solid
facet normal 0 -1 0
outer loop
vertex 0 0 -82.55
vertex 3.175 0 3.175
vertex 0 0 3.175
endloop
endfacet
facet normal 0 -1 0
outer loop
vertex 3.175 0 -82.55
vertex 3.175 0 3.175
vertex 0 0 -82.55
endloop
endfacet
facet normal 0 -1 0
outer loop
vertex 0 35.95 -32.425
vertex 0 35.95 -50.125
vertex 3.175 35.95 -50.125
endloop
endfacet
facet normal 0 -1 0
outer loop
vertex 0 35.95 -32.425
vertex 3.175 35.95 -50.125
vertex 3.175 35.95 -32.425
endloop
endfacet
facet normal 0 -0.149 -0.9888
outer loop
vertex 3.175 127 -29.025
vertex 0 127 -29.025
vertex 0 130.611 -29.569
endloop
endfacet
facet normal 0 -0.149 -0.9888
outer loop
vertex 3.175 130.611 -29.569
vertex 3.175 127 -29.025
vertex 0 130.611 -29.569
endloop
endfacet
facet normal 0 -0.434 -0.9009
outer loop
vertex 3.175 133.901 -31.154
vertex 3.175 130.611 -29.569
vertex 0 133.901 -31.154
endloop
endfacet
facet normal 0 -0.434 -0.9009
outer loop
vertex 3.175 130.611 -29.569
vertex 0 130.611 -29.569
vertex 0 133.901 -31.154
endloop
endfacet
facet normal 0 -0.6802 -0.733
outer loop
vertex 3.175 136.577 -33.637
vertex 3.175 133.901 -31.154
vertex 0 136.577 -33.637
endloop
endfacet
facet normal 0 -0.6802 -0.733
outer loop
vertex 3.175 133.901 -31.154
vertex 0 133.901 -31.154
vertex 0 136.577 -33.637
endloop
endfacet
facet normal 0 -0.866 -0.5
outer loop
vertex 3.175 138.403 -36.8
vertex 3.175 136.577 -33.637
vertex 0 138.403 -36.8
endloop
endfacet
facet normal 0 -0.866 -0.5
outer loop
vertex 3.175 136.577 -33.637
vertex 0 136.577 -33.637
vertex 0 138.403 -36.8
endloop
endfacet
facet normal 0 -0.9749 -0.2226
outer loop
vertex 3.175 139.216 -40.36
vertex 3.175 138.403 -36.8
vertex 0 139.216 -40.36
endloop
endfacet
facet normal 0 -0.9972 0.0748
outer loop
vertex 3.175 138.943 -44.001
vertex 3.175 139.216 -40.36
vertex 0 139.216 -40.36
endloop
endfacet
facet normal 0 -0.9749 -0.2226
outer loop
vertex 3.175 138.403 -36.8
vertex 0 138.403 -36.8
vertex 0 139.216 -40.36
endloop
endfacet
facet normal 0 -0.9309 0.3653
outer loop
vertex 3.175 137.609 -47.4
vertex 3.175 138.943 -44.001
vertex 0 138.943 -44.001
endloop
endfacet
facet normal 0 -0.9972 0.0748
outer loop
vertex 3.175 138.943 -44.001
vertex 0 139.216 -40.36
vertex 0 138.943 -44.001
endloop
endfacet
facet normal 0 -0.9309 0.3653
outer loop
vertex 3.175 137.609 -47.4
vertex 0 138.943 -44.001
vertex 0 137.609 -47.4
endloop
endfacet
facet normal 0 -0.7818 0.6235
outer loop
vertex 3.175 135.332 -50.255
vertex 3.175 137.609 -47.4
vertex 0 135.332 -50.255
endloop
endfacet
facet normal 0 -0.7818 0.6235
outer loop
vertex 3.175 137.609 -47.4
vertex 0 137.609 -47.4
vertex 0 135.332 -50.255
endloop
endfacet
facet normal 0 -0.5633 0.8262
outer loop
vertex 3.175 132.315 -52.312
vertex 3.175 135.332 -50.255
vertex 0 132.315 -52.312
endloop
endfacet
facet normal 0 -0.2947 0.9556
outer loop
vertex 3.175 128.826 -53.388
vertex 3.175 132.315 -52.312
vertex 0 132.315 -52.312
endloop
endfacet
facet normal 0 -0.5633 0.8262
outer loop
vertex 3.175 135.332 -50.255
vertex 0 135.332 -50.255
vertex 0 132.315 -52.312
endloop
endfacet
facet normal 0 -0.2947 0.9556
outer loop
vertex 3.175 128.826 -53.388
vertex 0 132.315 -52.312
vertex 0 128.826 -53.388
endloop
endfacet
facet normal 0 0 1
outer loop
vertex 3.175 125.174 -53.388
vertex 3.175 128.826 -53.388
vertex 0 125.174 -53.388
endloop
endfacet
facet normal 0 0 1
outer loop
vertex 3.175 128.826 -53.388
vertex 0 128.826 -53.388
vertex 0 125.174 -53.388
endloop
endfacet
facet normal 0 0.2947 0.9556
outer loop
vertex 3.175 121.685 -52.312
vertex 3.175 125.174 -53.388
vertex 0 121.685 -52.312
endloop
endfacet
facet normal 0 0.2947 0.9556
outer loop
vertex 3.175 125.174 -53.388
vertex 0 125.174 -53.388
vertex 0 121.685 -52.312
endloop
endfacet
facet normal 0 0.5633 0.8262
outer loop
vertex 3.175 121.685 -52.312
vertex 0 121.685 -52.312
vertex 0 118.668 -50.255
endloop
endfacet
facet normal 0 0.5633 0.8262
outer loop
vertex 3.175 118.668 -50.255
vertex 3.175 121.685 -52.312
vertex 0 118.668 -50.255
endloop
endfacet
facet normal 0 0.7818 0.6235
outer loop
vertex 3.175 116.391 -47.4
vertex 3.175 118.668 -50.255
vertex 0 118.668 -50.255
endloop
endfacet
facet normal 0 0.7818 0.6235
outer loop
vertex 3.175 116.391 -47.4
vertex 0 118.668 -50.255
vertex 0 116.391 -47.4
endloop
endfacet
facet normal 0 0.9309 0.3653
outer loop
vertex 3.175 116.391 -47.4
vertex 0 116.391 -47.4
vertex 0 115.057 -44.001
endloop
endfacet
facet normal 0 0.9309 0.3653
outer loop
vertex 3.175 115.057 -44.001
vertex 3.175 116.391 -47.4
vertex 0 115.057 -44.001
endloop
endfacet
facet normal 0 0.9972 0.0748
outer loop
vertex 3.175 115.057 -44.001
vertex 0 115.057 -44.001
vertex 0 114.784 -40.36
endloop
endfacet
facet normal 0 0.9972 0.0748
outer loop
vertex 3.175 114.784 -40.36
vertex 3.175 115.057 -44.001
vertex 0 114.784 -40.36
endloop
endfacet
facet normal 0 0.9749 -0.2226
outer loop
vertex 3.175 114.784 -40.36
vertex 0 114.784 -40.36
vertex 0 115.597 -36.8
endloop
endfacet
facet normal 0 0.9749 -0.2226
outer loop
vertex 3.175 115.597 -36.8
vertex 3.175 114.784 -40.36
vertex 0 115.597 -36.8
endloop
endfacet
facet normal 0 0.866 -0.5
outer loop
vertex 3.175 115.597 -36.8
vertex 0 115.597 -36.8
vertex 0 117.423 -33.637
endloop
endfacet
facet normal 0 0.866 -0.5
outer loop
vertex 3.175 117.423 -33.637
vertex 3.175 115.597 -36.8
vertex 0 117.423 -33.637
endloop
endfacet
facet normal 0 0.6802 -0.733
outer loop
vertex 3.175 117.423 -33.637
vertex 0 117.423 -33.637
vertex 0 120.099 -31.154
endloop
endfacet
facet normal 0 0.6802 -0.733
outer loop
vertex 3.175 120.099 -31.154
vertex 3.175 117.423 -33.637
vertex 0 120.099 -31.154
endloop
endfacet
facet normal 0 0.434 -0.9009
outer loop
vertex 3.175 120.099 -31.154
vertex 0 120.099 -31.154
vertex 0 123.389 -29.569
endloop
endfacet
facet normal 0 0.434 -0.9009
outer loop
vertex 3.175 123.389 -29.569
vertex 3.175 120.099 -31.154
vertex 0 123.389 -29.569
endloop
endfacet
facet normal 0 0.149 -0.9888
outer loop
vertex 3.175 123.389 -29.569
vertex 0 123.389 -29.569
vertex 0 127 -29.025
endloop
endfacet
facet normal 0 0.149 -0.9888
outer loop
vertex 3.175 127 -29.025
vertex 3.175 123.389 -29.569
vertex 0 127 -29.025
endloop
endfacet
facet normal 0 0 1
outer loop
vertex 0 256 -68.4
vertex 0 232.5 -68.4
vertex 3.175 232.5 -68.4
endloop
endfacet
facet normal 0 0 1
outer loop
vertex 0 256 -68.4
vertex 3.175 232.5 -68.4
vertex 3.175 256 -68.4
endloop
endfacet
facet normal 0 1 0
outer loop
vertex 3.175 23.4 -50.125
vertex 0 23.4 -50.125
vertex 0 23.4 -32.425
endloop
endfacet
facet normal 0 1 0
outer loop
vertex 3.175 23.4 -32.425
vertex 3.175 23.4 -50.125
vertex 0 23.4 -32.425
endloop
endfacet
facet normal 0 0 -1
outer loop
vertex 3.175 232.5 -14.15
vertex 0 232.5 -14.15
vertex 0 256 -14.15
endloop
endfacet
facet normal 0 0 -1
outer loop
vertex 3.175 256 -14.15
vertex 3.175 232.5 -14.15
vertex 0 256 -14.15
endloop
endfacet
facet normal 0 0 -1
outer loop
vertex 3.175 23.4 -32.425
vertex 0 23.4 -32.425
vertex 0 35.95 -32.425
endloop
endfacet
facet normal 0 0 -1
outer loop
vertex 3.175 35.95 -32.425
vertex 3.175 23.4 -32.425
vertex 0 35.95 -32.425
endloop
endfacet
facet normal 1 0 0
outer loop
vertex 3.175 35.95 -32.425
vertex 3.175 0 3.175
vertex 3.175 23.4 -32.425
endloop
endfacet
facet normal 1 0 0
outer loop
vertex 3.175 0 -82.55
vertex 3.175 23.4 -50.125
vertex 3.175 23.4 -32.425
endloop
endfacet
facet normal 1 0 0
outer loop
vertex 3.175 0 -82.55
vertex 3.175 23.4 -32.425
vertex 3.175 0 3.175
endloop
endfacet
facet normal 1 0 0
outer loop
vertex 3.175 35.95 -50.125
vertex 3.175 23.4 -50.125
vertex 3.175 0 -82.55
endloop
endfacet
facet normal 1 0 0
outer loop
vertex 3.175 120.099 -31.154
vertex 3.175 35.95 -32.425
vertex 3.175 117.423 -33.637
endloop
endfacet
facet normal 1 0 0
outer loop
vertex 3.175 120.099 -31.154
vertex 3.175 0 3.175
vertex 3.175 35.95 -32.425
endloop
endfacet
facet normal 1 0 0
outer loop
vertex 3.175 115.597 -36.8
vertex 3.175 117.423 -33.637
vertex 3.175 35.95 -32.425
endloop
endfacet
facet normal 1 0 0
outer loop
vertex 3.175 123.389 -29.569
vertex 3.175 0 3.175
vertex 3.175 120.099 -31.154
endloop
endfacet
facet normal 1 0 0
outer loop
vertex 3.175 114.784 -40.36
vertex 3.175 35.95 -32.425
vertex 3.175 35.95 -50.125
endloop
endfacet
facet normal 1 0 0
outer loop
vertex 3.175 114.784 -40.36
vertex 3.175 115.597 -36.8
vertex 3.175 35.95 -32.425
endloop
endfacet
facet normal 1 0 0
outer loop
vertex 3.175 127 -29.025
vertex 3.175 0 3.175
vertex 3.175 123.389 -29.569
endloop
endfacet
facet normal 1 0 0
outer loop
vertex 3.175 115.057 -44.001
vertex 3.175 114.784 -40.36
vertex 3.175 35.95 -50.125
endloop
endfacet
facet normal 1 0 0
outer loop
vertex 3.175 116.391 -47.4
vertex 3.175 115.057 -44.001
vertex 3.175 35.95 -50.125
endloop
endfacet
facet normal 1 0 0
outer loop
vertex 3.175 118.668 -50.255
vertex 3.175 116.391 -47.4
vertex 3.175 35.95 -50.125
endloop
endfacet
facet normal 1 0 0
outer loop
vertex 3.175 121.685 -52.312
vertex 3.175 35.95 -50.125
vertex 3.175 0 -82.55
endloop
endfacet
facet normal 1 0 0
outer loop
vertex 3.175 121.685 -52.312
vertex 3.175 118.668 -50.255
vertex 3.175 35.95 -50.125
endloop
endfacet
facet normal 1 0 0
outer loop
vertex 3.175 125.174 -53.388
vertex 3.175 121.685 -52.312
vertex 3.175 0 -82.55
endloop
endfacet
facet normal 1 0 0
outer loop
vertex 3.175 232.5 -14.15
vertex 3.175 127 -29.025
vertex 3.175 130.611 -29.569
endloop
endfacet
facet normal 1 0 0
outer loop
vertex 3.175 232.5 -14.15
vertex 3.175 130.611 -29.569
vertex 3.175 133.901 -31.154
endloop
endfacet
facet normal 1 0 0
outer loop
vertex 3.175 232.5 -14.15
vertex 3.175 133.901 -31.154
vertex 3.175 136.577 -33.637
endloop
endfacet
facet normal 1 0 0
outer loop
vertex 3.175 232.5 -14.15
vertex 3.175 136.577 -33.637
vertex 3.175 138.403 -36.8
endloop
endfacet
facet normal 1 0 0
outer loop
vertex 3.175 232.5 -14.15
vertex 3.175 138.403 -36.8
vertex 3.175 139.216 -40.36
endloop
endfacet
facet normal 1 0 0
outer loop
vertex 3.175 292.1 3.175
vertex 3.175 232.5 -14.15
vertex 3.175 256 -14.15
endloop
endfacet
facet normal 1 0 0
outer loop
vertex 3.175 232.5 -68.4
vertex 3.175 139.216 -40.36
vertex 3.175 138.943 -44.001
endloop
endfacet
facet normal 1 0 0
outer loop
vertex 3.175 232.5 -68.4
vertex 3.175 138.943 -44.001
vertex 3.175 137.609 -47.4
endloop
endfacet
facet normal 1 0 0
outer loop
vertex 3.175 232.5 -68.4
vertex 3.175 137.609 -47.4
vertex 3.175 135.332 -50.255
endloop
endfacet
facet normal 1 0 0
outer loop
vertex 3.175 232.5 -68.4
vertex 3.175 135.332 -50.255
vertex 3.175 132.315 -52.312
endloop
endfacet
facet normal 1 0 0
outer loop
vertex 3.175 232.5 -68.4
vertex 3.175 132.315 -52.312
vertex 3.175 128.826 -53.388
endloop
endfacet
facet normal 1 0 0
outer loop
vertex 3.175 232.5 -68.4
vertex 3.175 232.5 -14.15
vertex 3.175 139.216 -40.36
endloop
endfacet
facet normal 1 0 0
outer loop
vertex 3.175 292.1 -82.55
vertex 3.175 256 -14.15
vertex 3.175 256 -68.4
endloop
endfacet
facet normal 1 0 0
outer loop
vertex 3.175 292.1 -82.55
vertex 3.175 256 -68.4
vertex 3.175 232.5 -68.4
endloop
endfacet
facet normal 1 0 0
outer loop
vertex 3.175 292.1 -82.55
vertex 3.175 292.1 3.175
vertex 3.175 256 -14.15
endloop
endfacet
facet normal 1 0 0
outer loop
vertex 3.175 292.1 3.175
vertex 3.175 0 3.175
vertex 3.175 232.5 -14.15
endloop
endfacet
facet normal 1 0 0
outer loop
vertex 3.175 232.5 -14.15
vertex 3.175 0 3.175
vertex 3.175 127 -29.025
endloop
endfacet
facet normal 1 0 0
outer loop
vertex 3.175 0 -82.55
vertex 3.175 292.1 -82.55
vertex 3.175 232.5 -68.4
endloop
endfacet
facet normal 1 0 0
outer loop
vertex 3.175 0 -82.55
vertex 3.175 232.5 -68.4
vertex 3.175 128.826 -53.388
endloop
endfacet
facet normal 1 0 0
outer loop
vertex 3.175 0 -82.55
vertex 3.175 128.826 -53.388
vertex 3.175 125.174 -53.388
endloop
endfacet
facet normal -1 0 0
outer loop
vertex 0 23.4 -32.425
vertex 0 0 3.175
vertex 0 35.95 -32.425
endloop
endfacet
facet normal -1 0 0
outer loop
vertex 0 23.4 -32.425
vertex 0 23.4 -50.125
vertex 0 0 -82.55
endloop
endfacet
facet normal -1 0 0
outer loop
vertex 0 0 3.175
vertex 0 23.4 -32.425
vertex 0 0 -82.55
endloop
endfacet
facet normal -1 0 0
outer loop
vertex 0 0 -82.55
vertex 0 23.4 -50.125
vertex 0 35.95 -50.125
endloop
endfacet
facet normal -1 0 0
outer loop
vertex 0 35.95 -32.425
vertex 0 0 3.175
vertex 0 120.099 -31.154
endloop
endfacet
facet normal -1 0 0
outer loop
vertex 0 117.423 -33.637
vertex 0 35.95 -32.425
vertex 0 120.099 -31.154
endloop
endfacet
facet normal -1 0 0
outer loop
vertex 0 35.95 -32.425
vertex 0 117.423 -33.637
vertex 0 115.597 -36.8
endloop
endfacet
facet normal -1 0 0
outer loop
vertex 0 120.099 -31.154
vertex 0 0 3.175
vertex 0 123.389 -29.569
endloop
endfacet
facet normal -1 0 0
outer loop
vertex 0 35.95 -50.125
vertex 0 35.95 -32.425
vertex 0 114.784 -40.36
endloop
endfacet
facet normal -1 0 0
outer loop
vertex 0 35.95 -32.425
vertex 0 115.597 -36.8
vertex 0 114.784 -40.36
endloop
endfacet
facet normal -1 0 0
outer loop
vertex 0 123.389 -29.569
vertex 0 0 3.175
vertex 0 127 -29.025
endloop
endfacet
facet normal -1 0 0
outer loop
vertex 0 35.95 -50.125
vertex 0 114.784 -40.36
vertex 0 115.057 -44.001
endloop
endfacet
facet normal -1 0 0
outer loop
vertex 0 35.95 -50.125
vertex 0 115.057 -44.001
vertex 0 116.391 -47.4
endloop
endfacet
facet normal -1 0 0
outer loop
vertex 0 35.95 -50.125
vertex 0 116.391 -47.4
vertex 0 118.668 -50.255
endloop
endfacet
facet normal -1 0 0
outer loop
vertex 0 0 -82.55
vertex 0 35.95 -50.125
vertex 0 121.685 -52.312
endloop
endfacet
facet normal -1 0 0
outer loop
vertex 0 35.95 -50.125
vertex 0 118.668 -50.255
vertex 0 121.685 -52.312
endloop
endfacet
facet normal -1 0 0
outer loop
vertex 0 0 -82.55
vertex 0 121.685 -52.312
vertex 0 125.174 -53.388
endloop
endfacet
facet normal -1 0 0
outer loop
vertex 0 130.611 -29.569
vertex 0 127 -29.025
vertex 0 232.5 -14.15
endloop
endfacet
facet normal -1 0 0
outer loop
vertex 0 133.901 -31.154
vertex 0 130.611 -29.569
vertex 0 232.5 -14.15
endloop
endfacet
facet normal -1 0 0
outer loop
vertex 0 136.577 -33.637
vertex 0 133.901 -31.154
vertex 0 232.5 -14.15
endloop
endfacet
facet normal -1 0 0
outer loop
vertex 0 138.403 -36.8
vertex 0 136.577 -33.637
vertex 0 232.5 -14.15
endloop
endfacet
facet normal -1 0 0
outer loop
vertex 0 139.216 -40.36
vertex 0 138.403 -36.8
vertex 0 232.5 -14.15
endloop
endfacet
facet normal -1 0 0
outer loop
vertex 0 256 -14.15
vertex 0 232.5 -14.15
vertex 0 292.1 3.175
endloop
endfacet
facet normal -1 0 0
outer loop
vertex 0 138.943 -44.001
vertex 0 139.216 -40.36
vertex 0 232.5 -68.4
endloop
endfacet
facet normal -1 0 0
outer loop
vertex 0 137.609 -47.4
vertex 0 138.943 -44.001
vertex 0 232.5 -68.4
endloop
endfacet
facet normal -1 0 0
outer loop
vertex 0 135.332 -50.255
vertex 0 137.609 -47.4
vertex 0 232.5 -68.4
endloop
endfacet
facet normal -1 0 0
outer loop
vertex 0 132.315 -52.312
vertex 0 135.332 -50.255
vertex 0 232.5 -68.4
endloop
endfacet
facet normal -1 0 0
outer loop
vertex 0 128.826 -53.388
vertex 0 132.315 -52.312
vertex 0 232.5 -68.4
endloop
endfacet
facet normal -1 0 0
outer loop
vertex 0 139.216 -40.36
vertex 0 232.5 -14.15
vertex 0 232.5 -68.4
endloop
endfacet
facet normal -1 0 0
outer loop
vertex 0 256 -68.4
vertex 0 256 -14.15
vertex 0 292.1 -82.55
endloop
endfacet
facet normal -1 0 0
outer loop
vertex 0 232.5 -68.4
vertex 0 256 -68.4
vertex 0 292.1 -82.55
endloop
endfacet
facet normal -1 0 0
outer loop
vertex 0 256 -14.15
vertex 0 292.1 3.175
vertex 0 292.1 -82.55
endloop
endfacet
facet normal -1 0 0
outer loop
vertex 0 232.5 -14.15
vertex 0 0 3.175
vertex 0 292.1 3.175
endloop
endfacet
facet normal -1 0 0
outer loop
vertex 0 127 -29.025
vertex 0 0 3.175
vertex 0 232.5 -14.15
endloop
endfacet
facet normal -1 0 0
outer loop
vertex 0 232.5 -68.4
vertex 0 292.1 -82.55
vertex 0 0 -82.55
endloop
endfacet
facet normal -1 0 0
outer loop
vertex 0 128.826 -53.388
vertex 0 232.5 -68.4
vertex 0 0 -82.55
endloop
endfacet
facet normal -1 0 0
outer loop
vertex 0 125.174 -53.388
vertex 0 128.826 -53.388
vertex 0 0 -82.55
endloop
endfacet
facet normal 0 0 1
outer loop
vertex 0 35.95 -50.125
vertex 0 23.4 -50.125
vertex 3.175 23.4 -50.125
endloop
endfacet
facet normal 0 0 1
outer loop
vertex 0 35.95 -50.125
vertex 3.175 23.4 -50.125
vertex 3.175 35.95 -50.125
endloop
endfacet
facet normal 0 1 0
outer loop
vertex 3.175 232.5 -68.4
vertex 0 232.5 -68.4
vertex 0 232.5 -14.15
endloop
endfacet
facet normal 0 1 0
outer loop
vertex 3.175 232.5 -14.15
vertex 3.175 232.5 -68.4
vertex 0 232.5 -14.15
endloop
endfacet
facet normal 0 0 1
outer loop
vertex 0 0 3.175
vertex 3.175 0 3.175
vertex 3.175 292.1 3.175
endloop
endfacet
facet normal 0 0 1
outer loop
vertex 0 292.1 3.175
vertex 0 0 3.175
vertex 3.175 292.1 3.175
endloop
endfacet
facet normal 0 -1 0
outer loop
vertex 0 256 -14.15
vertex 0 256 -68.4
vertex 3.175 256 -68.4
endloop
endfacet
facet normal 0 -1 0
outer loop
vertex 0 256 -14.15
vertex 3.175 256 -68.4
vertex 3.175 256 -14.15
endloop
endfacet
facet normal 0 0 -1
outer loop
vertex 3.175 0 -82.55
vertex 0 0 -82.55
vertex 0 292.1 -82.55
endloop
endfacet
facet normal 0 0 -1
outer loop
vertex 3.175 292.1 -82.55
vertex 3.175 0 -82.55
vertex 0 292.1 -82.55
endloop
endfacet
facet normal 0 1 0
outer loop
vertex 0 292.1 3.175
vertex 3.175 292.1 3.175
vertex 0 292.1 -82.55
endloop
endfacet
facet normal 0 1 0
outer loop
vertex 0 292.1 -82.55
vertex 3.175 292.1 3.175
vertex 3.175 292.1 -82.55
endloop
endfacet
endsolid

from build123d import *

# Parameters (mm, degrees)
SKETCH1_W           = 82.55
SKETCH1_H           = 292.1
BOSS_EXTRUDE1_DEPTH = 3.175
CUT_EXTRUDE1_REACH  = 305.557
SKETCH2_W           = 50.25
SKETCH2_H           = 19.5
CUT_EXTRUDE2_REACH  = 305.557
SKETCH4_R           = 10.25
CUT_EXTRUDE3_REACH  = 305.557
SKETCH5_W           = 13.7
SKETCH5_H           = 8.55
CUT_EXTRUDE4_REACH  = 305.557
SKETCH6_R           = 12.25
SKETCH6_R_2         = 10.25
SKETCH6_W           = 54.25
SKETCH6_H           = 23.5
SKETCH6_W_2         = 50.25
SKETCH6_H_2         = 19.5
SKETCH6_W_3         = 17.7
SKETCH6_H_3         = 12.55
SKETCH6_W_4         = 13.7
SKETCH6_H_4         = 8.55
SKETCH7_W           = 3.175
SKETCH7_H           = 292.1
BOSS_EXTRUDE2_DEPTH = 3.175


with BuildPart() as part:
    # Sketch1 → Boss-Extrude1 (new body)
    with BuildSketch(Plane(origin=(0, 0, 0), x_dir=(0, 0, -1), z_dir=(1, 0, 0))):
        with Locations((41.275, 146.05)):
            Rectangle(SKETCH1_W, SKETCH1_H)
    extrude(amount=BOSS_EXTRUDE1_DEPTH)

    # Sketch2 → Cut-Extrude1 (cut, up to next)
    with BuildSketch(Plane.ZY, mode=Mode.PRIVATE) as cut_extrude1_sk1:
        with Locations((-41.275, 244.25)):
            Rectangle(SKETCH2_W, SKETCH2_H)
    cut_extrude1_tool1 = extrude(cut_extrude1_sk1.sketch, amount=-CUT_EXTRUDE1_REACH, mode=Mode.PRIVATE) & part.part
    add(cut_extrude1_tool1.solids().sort_by_distance((0, 244.25, -41.275))[0], mode=Mode.SUBTRACT)

    # Sketch4 → Cut-Extrude2 (cut, up to next)
    with BuildSketch(Plane.ZY, mode=Mode.PRIVATE) as cut_extrude2_sk1:
        with Locations((-41.275, 127)):
            Circle(SKETCH4_R)
    cut_extrude2_tool1 = extrude(cut_extrude2_sk1.sketch, amount=-CUT_EXTRUDE2_REACH, mode=Mode.PRIVATE) & part.part
    add(cut_extrude2_tool1.solids().sort_by_distance((0, 127, -41.275))[0], mode=Mode.SUBTRACT)

    # Sketch5 → Cut-Extrude3 (cut, up to next)
    with BuildSketch(Plane.ZY, mode=Mode.PRIVATE) as cut_extrude3_sk1:
        with Locations((-41.275, 29.675)):
            Rectangle(SKETCH5_W, SKETCH5_H)
    cut_extrude3_tool1 = extrude(cut_extrude3_sk1.sketch, amount=-CUT_EXTRUDE3_REACH, mode=Mode.PRIVATE) & part.part
    add(cut_extrude3_tool1.solids().sort_by_distance((0, 29.675, -41.275))[0], mode=Mode.SUBTRACT)

    # Sketch6 → Cut-Extrude4 (cut, up to next)
    with BuildSketch(Plane.ZY, mode=Mode.PRIVATE) as cut_extrude4_sk1:
        with Locations((-41.275, 127)):
            Circle(SKETCH6_R)
        with Locations((-41.275, 127)):
            Circle(SKETCH6_R_2, mode=Mode.SUBTRACT)
    cut_extrude4_tool1 = extrude(cut_extrude4_sk1.sketch, amount=-CUT_EXTRUDE4_REACH, mode=Mode.PRIVATE) & part.part
    # Sketch6 → Cut-Extrude4 (cut, up to next)
    with BuildSketch(Plane.ZY, mode=Mode.PRIVATE) as cut_extrude4_sk2:
        with Locations((-41.275, 244.25)):
            Rectangle(SKETCH6_W, SKETCH6_H)
        with Locations((-41.275, 244.25)):
            Rectangle(SKETCH6_W_2, SKETCH6_H_2, mode=Mode.SUBTRACT)
    cut_extrude4_tool2 = extrude(cut_extrude4_sk2.sketch, amount=-CUT_EXTRUDE4_REACH, mode=Mode.PRIVATE) & part.part
    # Sketch6 → Cut-Extrude4 (cut, up to next)
    with BuildSketch(Plane.ZY, mode=Mode.PRIVATE) as cut_extrude4_sk3:
        with Locations((-41.275, 29.675)):
            Rectangle(SKETCH6_W_3, SKETCH6_H_3)
        with Locations((-41.275, 29.675)):
            Rectangle(SKETCH6_W_4, SKETCH6_H_4, mode=Mode.SUBTRACT)
    cut_extrude4_tool3 = extrude(cut_extrude4_sk3.sketch, amount=-CUT_EXTRUDE4_REACH, mode=Mode.PRIVATE) & part.part
    add(cut_extrude4_tool1.solids().sort_by_distance((0, 127, -53.178518))[0], mode=Mode.SUBTRACT)
    add(cut_extrude4_tool2.solids().sort_by_distance((0, 255.408788, -41.275))[0], mode=Mode.SUBTRACT)
    add(cut_extrude4_tool3.solids().sort_by_distance((0, 35.733022, -41.275))[0], mode=Mode.SUBTRACT)


with BuildPart() as body_2:
    # Sketch7 → Boss-Extrude2 (new body)
    with BuildSketch(Plane(origin=(3.175, 0, 0), x_dir=(0, 0, -1), z_dir=(1, 0, 0))):
        with Locations((-1.5875, 146.05)):
            Rectangle(SKETCH7_W, SKETCH7_H)
    extrude(amount=-BOSS_EXTRUDE2_DEPTH)


with BuildPart() as part_1:
    add(part.part)

    # Combine1: union body 2
    add(body_2.part)


solid = part_1.part
